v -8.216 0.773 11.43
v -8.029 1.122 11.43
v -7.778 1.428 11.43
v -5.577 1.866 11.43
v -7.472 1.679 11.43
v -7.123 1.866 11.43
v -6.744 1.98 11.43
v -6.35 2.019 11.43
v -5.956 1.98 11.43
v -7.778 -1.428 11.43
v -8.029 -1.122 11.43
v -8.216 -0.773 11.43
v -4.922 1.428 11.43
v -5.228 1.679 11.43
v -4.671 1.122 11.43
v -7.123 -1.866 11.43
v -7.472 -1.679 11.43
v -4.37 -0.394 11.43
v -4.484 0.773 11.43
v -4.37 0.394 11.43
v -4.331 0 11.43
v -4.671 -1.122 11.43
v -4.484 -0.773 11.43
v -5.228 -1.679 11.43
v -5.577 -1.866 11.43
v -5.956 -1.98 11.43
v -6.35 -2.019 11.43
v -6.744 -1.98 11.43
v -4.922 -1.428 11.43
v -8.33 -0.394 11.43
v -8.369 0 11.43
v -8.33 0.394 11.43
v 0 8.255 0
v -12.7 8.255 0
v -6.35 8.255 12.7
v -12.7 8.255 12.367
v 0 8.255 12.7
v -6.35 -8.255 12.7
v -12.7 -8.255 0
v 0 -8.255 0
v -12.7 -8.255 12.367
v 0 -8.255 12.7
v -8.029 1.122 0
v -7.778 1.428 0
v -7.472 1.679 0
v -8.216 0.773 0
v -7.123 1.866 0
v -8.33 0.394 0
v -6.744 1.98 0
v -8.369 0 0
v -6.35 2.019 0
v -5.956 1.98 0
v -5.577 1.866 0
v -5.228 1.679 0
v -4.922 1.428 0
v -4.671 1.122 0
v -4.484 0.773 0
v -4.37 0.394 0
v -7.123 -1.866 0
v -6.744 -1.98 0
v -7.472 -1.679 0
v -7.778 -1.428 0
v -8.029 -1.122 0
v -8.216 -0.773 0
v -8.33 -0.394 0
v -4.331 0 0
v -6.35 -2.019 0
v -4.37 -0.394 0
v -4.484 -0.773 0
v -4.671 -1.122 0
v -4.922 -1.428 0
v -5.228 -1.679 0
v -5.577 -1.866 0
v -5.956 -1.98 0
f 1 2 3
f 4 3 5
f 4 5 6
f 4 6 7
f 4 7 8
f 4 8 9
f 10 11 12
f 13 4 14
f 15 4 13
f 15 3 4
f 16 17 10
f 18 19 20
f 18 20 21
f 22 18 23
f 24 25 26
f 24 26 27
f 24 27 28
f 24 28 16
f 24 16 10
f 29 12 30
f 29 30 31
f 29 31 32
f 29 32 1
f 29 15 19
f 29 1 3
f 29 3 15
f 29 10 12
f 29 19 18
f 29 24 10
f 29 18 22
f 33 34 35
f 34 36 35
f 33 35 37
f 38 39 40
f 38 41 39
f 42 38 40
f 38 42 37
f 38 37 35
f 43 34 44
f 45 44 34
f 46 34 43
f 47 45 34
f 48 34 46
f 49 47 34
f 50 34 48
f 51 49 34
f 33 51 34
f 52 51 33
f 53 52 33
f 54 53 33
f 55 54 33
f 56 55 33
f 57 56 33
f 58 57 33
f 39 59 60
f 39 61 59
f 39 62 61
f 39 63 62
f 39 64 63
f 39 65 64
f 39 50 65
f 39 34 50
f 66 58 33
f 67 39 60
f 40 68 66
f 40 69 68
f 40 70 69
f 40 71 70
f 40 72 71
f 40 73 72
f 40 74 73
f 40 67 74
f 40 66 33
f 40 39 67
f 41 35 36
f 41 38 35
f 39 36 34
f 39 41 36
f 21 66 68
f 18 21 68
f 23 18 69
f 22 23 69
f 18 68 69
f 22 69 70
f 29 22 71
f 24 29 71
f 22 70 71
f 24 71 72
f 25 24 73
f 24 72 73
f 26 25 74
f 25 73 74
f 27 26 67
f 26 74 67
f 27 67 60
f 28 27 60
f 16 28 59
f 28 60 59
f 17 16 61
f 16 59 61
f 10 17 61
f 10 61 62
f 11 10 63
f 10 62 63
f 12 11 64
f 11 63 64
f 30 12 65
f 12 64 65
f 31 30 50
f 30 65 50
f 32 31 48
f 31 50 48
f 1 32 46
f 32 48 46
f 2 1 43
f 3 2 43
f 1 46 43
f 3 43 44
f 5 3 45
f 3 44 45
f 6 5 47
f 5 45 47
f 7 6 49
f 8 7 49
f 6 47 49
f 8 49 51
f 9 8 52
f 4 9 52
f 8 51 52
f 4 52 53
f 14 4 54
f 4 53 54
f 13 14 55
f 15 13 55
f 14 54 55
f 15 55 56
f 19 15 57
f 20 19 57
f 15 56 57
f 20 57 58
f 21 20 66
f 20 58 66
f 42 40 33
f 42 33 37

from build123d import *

# Parameters (mm, degrees)
F1_DEPTH = 8.255
F2_R     = 2.0193
F3_DEPTH = 11.43


with BuildPart() as f1:
    # F0 (on Front) → F1 (new body, symmetric)
    with BuildSketch(Plane.XZ):
        Polygon((-12.7, 0), (0, 0), (0, 12.7), (-6.35, 12.7), (-12.7, 12.3672106016), align=None)
    extrude(amount=F1_DEPTH, both=True)

    # F2 (on face) → F3 (cut)
    with BuildSketch(Plane(origin=(0, 0, 0), x_dir=(1, 0, 0), z_dir=(0, 0, -1))):
        with Locations((-6.35, 0)):
            Circle(F2_R)
    extrude(amount=-F3_DEPTH, mode=Mode.SUBTRACT)


solid = f1.part
